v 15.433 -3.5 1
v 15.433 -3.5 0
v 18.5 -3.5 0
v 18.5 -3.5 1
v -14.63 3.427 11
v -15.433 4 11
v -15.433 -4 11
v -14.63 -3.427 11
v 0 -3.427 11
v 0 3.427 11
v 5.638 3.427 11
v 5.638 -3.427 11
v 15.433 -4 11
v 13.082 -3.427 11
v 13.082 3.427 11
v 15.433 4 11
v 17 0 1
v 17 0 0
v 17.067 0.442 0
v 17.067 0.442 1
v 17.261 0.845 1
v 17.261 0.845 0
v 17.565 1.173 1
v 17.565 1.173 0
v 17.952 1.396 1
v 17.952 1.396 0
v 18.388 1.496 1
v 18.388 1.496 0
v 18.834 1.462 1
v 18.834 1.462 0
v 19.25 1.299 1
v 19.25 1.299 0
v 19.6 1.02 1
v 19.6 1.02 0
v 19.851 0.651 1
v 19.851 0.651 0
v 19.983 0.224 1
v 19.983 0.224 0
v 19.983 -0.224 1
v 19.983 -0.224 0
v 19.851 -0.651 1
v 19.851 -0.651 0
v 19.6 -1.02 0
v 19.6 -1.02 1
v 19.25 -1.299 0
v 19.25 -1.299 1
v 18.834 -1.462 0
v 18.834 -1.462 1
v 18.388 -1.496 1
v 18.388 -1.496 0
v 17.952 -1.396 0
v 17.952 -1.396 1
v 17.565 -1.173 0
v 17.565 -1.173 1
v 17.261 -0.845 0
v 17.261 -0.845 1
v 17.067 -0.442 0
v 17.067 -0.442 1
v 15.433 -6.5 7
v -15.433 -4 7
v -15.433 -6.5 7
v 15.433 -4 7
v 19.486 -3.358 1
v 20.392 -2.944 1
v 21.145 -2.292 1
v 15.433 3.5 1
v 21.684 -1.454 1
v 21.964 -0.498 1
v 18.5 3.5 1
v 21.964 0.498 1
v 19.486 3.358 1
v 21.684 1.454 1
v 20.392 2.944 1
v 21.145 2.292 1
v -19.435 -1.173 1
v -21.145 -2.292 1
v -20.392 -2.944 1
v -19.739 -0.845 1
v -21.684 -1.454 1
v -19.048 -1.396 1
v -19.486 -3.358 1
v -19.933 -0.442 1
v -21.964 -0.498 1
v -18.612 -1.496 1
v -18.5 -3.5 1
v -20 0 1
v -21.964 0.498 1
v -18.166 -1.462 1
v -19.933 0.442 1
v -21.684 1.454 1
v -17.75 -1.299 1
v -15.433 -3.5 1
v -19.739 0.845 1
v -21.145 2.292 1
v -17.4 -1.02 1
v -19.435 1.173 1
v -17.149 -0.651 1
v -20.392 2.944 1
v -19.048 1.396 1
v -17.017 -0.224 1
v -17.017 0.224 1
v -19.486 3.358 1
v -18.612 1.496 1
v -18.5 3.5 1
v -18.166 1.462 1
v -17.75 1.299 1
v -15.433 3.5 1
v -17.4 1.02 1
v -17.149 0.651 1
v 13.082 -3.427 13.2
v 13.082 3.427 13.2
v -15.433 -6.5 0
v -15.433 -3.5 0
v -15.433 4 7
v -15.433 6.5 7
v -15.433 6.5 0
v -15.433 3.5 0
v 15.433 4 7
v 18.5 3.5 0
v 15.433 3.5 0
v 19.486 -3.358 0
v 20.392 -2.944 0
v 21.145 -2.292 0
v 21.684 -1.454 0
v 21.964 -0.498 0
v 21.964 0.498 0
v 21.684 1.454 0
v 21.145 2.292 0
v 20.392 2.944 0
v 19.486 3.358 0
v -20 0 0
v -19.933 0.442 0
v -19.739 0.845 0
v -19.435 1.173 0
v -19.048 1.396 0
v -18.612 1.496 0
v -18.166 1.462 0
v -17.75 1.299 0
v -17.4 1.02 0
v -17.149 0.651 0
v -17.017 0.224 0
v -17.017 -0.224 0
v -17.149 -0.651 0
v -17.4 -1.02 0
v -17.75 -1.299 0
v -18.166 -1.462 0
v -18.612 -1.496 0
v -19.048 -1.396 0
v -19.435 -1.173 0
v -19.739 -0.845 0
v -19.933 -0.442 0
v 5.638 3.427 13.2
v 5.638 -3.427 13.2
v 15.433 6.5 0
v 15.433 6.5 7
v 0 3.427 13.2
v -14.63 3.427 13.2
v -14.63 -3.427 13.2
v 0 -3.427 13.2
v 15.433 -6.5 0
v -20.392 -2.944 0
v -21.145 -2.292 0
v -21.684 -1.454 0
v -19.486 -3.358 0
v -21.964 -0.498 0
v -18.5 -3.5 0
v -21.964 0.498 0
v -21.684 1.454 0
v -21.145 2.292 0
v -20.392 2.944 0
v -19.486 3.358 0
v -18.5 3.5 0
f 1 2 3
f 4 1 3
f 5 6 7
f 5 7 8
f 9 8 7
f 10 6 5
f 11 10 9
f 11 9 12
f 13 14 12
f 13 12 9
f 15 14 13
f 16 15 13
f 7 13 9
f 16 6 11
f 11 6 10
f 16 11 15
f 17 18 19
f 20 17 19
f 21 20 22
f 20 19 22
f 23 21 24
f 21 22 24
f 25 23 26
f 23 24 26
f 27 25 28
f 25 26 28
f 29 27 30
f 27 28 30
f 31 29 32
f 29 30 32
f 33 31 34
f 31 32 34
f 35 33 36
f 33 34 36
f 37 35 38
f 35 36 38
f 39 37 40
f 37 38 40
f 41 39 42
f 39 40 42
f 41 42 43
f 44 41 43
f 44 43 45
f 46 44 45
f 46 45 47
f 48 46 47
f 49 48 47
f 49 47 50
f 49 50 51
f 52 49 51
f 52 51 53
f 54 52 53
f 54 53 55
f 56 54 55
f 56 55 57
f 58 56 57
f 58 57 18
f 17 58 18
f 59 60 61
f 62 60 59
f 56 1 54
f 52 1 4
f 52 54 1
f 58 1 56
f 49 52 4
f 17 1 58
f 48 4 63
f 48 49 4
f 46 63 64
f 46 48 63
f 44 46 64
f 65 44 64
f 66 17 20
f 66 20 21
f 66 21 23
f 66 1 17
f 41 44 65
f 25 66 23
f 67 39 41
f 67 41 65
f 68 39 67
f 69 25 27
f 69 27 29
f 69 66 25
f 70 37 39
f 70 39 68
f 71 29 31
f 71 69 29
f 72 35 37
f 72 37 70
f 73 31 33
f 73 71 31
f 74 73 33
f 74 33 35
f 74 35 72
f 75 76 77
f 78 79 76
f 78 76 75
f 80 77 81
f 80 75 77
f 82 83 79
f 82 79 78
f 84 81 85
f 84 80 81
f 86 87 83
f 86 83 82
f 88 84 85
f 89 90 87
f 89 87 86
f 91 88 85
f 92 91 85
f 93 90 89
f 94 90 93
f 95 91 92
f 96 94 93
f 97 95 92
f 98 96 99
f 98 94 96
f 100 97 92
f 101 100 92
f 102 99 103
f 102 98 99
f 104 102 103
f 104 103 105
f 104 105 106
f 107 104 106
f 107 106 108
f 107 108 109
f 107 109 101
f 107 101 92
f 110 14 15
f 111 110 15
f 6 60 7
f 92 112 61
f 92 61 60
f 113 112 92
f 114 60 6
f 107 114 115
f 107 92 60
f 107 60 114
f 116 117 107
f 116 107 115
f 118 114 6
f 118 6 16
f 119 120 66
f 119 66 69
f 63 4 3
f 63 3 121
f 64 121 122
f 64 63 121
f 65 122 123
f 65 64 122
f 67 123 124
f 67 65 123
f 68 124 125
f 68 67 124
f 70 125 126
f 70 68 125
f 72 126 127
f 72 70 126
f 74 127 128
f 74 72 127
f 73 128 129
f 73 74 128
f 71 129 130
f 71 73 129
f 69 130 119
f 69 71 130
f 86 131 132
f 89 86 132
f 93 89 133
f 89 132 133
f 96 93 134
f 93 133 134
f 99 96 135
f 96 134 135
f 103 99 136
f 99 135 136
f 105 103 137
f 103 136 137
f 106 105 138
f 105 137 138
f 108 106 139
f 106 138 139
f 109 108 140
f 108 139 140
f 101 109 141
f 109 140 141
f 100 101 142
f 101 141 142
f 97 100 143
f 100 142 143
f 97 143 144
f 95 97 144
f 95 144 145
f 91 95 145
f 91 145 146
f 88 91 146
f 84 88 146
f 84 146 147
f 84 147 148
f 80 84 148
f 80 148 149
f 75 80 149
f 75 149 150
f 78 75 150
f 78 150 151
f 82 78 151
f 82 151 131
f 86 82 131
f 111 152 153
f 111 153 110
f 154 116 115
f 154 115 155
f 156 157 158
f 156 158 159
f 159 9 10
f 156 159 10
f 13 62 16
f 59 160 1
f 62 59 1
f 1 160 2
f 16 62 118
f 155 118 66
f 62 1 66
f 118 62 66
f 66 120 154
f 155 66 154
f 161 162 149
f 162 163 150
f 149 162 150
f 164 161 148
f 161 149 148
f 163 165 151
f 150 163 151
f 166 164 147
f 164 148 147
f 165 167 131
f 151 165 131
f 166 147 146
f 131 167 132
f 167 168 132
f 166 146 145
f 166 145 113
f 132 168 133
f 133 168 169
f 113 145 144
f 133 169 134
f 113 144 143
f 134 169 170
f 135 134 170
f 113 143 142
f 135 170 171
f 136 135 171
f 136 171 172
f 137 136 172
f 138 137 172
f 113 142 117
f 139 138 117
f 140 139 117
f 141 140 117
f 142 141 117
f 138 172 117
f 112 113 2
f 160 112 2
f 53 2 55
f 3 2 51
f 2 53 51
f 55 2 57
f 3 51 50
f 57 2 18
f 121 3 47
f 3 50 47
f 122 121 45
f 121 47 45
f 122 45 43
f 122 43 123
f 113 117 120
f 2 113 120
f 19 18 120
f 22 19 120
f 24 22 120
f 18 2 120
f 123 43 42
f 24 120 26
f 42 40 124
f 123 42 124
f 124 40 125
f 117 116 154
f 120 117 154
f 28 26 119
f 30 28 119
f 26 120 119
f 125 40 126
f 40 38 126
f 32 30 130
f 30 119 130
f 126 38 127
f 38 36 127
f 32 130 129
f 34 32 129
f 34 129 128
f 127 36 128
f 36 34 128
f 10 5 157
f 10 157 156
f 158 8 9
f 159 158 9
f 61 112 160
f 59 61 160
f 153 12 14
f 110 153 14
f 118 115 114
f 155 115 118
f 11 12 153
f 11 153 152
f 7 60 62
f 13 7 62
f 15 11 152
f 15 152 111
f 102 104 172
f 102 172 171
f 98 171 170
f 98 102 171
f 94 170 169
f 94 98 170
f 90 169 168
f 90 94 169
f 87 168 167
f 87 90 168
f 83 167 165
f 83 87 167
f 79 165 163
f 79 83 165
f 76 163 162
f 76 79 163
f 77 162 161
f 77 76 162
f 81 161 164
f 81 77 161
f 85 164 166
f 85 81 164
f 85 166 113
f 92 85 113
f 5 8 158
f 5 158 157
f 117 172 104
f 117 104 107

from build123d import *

# Parameters (mm, degrees)
SKETCH_1_W                = 37
SKETCH_1_H                = 7
EXTRUDE_1_DEPTH           = 1
SKETCH_3_W                = 30.866999712
SKETCH_3_H                = 13
EXTRUDE_2_DEPTH           = 7
SKETCH_4_W                = 30.866999712
SKETCH_4_H                = 8
EXTRUDE_3_DEPTH           = 11
SKETCH_5_W                = 14.630132385
SKETCH_5_H                = 6.854419706
SKETCH_5_W_2              = 7.444047208
EXTRUDE_4_DEPTH           = 13.2
SKETCH_6_R                = 3.5
EXTRUDE_5_DEPTH           = 1
HOLE_WIZARD_3_0_3_1_D     = 3
HOLE_WIZARD_3_0_3_1_DEPTH = 8.5
HOLE_WIZARD_3_0_3_1_TIP   = 0.901290929


with BuildPart() as part:
    # 草图1 → 凸台-拉伸1 (new body)
    with BuildSketch(Plane.XY):
        Rectangle(SKETCH_1_W, SKETCH_1_H)
    extrude(amount=EXTRUDE_1_DEPTH)

    # 草图3 → 凸台-拉伸2 (add)
    with BuildSketch(Plane.XY):
        Rectangle(SKETCH_3_W, SKETCH_3_H)
    extrude(amount=EXTRUDE_2_DEPTH)

    # 草图4 → 凸台-拉伸3 (add)
    with BuildSketch(Plane.XY):
        Rectangle(SKETCH_4_W, SKETCH_4_H)
    extrude(amount=EXTRUDE_3_DEPTH)

    # 草图5 → 凸台-拉伸4 (add)
    with BuildSketch(Plane.XY):
        with Locations((-7.315066193, 0)):
            Rectangle(SKETCH_5_W, SKETCH_5_H)
        with Locations((9.360336589, 0)):
            Rectangle(SKETCH_5_W_2, SKETCH_5_H)
    extrude(amount=EXTRUDE_4_DEPTH)

    # 草图6 → 凸台-拉伸5 (add)
    with BuildSketch(Plane.XY.offset(1)):
        with Locations((18.5, 0)):
            Circle(SKETCH_6_R)
        with Locations((-18.5, 0)):
            Circle(SKETCH_6_R)
    extrude(amount=-EXTRUDE_5_DEPTH)

    # Ø3.0 (3) 直径孔1
    with Locations(Plane.XY.offset(1)):
        with Locations((-18.5, 0), (18.5, 0)):
            Hole(HOLE_WIZARD_3_0_3_1_D / 2, depth=HOLE_WIZARD_3_0_3_1_DEPTH)
            with Locations((0, 0, -(HOLE_WIZARD_3_0_3_1_DEPTH + HOLE_WIZARD_3_0_3_1_TIP / 2))):  # 118° drill point
                Cone(0, HOLE_WIZARD_3_0_3_1_D / 2, HOLE_WIZARD_3_0_3_1_TIP, mode=Mode.SUBTRACT)


solid = part.part
